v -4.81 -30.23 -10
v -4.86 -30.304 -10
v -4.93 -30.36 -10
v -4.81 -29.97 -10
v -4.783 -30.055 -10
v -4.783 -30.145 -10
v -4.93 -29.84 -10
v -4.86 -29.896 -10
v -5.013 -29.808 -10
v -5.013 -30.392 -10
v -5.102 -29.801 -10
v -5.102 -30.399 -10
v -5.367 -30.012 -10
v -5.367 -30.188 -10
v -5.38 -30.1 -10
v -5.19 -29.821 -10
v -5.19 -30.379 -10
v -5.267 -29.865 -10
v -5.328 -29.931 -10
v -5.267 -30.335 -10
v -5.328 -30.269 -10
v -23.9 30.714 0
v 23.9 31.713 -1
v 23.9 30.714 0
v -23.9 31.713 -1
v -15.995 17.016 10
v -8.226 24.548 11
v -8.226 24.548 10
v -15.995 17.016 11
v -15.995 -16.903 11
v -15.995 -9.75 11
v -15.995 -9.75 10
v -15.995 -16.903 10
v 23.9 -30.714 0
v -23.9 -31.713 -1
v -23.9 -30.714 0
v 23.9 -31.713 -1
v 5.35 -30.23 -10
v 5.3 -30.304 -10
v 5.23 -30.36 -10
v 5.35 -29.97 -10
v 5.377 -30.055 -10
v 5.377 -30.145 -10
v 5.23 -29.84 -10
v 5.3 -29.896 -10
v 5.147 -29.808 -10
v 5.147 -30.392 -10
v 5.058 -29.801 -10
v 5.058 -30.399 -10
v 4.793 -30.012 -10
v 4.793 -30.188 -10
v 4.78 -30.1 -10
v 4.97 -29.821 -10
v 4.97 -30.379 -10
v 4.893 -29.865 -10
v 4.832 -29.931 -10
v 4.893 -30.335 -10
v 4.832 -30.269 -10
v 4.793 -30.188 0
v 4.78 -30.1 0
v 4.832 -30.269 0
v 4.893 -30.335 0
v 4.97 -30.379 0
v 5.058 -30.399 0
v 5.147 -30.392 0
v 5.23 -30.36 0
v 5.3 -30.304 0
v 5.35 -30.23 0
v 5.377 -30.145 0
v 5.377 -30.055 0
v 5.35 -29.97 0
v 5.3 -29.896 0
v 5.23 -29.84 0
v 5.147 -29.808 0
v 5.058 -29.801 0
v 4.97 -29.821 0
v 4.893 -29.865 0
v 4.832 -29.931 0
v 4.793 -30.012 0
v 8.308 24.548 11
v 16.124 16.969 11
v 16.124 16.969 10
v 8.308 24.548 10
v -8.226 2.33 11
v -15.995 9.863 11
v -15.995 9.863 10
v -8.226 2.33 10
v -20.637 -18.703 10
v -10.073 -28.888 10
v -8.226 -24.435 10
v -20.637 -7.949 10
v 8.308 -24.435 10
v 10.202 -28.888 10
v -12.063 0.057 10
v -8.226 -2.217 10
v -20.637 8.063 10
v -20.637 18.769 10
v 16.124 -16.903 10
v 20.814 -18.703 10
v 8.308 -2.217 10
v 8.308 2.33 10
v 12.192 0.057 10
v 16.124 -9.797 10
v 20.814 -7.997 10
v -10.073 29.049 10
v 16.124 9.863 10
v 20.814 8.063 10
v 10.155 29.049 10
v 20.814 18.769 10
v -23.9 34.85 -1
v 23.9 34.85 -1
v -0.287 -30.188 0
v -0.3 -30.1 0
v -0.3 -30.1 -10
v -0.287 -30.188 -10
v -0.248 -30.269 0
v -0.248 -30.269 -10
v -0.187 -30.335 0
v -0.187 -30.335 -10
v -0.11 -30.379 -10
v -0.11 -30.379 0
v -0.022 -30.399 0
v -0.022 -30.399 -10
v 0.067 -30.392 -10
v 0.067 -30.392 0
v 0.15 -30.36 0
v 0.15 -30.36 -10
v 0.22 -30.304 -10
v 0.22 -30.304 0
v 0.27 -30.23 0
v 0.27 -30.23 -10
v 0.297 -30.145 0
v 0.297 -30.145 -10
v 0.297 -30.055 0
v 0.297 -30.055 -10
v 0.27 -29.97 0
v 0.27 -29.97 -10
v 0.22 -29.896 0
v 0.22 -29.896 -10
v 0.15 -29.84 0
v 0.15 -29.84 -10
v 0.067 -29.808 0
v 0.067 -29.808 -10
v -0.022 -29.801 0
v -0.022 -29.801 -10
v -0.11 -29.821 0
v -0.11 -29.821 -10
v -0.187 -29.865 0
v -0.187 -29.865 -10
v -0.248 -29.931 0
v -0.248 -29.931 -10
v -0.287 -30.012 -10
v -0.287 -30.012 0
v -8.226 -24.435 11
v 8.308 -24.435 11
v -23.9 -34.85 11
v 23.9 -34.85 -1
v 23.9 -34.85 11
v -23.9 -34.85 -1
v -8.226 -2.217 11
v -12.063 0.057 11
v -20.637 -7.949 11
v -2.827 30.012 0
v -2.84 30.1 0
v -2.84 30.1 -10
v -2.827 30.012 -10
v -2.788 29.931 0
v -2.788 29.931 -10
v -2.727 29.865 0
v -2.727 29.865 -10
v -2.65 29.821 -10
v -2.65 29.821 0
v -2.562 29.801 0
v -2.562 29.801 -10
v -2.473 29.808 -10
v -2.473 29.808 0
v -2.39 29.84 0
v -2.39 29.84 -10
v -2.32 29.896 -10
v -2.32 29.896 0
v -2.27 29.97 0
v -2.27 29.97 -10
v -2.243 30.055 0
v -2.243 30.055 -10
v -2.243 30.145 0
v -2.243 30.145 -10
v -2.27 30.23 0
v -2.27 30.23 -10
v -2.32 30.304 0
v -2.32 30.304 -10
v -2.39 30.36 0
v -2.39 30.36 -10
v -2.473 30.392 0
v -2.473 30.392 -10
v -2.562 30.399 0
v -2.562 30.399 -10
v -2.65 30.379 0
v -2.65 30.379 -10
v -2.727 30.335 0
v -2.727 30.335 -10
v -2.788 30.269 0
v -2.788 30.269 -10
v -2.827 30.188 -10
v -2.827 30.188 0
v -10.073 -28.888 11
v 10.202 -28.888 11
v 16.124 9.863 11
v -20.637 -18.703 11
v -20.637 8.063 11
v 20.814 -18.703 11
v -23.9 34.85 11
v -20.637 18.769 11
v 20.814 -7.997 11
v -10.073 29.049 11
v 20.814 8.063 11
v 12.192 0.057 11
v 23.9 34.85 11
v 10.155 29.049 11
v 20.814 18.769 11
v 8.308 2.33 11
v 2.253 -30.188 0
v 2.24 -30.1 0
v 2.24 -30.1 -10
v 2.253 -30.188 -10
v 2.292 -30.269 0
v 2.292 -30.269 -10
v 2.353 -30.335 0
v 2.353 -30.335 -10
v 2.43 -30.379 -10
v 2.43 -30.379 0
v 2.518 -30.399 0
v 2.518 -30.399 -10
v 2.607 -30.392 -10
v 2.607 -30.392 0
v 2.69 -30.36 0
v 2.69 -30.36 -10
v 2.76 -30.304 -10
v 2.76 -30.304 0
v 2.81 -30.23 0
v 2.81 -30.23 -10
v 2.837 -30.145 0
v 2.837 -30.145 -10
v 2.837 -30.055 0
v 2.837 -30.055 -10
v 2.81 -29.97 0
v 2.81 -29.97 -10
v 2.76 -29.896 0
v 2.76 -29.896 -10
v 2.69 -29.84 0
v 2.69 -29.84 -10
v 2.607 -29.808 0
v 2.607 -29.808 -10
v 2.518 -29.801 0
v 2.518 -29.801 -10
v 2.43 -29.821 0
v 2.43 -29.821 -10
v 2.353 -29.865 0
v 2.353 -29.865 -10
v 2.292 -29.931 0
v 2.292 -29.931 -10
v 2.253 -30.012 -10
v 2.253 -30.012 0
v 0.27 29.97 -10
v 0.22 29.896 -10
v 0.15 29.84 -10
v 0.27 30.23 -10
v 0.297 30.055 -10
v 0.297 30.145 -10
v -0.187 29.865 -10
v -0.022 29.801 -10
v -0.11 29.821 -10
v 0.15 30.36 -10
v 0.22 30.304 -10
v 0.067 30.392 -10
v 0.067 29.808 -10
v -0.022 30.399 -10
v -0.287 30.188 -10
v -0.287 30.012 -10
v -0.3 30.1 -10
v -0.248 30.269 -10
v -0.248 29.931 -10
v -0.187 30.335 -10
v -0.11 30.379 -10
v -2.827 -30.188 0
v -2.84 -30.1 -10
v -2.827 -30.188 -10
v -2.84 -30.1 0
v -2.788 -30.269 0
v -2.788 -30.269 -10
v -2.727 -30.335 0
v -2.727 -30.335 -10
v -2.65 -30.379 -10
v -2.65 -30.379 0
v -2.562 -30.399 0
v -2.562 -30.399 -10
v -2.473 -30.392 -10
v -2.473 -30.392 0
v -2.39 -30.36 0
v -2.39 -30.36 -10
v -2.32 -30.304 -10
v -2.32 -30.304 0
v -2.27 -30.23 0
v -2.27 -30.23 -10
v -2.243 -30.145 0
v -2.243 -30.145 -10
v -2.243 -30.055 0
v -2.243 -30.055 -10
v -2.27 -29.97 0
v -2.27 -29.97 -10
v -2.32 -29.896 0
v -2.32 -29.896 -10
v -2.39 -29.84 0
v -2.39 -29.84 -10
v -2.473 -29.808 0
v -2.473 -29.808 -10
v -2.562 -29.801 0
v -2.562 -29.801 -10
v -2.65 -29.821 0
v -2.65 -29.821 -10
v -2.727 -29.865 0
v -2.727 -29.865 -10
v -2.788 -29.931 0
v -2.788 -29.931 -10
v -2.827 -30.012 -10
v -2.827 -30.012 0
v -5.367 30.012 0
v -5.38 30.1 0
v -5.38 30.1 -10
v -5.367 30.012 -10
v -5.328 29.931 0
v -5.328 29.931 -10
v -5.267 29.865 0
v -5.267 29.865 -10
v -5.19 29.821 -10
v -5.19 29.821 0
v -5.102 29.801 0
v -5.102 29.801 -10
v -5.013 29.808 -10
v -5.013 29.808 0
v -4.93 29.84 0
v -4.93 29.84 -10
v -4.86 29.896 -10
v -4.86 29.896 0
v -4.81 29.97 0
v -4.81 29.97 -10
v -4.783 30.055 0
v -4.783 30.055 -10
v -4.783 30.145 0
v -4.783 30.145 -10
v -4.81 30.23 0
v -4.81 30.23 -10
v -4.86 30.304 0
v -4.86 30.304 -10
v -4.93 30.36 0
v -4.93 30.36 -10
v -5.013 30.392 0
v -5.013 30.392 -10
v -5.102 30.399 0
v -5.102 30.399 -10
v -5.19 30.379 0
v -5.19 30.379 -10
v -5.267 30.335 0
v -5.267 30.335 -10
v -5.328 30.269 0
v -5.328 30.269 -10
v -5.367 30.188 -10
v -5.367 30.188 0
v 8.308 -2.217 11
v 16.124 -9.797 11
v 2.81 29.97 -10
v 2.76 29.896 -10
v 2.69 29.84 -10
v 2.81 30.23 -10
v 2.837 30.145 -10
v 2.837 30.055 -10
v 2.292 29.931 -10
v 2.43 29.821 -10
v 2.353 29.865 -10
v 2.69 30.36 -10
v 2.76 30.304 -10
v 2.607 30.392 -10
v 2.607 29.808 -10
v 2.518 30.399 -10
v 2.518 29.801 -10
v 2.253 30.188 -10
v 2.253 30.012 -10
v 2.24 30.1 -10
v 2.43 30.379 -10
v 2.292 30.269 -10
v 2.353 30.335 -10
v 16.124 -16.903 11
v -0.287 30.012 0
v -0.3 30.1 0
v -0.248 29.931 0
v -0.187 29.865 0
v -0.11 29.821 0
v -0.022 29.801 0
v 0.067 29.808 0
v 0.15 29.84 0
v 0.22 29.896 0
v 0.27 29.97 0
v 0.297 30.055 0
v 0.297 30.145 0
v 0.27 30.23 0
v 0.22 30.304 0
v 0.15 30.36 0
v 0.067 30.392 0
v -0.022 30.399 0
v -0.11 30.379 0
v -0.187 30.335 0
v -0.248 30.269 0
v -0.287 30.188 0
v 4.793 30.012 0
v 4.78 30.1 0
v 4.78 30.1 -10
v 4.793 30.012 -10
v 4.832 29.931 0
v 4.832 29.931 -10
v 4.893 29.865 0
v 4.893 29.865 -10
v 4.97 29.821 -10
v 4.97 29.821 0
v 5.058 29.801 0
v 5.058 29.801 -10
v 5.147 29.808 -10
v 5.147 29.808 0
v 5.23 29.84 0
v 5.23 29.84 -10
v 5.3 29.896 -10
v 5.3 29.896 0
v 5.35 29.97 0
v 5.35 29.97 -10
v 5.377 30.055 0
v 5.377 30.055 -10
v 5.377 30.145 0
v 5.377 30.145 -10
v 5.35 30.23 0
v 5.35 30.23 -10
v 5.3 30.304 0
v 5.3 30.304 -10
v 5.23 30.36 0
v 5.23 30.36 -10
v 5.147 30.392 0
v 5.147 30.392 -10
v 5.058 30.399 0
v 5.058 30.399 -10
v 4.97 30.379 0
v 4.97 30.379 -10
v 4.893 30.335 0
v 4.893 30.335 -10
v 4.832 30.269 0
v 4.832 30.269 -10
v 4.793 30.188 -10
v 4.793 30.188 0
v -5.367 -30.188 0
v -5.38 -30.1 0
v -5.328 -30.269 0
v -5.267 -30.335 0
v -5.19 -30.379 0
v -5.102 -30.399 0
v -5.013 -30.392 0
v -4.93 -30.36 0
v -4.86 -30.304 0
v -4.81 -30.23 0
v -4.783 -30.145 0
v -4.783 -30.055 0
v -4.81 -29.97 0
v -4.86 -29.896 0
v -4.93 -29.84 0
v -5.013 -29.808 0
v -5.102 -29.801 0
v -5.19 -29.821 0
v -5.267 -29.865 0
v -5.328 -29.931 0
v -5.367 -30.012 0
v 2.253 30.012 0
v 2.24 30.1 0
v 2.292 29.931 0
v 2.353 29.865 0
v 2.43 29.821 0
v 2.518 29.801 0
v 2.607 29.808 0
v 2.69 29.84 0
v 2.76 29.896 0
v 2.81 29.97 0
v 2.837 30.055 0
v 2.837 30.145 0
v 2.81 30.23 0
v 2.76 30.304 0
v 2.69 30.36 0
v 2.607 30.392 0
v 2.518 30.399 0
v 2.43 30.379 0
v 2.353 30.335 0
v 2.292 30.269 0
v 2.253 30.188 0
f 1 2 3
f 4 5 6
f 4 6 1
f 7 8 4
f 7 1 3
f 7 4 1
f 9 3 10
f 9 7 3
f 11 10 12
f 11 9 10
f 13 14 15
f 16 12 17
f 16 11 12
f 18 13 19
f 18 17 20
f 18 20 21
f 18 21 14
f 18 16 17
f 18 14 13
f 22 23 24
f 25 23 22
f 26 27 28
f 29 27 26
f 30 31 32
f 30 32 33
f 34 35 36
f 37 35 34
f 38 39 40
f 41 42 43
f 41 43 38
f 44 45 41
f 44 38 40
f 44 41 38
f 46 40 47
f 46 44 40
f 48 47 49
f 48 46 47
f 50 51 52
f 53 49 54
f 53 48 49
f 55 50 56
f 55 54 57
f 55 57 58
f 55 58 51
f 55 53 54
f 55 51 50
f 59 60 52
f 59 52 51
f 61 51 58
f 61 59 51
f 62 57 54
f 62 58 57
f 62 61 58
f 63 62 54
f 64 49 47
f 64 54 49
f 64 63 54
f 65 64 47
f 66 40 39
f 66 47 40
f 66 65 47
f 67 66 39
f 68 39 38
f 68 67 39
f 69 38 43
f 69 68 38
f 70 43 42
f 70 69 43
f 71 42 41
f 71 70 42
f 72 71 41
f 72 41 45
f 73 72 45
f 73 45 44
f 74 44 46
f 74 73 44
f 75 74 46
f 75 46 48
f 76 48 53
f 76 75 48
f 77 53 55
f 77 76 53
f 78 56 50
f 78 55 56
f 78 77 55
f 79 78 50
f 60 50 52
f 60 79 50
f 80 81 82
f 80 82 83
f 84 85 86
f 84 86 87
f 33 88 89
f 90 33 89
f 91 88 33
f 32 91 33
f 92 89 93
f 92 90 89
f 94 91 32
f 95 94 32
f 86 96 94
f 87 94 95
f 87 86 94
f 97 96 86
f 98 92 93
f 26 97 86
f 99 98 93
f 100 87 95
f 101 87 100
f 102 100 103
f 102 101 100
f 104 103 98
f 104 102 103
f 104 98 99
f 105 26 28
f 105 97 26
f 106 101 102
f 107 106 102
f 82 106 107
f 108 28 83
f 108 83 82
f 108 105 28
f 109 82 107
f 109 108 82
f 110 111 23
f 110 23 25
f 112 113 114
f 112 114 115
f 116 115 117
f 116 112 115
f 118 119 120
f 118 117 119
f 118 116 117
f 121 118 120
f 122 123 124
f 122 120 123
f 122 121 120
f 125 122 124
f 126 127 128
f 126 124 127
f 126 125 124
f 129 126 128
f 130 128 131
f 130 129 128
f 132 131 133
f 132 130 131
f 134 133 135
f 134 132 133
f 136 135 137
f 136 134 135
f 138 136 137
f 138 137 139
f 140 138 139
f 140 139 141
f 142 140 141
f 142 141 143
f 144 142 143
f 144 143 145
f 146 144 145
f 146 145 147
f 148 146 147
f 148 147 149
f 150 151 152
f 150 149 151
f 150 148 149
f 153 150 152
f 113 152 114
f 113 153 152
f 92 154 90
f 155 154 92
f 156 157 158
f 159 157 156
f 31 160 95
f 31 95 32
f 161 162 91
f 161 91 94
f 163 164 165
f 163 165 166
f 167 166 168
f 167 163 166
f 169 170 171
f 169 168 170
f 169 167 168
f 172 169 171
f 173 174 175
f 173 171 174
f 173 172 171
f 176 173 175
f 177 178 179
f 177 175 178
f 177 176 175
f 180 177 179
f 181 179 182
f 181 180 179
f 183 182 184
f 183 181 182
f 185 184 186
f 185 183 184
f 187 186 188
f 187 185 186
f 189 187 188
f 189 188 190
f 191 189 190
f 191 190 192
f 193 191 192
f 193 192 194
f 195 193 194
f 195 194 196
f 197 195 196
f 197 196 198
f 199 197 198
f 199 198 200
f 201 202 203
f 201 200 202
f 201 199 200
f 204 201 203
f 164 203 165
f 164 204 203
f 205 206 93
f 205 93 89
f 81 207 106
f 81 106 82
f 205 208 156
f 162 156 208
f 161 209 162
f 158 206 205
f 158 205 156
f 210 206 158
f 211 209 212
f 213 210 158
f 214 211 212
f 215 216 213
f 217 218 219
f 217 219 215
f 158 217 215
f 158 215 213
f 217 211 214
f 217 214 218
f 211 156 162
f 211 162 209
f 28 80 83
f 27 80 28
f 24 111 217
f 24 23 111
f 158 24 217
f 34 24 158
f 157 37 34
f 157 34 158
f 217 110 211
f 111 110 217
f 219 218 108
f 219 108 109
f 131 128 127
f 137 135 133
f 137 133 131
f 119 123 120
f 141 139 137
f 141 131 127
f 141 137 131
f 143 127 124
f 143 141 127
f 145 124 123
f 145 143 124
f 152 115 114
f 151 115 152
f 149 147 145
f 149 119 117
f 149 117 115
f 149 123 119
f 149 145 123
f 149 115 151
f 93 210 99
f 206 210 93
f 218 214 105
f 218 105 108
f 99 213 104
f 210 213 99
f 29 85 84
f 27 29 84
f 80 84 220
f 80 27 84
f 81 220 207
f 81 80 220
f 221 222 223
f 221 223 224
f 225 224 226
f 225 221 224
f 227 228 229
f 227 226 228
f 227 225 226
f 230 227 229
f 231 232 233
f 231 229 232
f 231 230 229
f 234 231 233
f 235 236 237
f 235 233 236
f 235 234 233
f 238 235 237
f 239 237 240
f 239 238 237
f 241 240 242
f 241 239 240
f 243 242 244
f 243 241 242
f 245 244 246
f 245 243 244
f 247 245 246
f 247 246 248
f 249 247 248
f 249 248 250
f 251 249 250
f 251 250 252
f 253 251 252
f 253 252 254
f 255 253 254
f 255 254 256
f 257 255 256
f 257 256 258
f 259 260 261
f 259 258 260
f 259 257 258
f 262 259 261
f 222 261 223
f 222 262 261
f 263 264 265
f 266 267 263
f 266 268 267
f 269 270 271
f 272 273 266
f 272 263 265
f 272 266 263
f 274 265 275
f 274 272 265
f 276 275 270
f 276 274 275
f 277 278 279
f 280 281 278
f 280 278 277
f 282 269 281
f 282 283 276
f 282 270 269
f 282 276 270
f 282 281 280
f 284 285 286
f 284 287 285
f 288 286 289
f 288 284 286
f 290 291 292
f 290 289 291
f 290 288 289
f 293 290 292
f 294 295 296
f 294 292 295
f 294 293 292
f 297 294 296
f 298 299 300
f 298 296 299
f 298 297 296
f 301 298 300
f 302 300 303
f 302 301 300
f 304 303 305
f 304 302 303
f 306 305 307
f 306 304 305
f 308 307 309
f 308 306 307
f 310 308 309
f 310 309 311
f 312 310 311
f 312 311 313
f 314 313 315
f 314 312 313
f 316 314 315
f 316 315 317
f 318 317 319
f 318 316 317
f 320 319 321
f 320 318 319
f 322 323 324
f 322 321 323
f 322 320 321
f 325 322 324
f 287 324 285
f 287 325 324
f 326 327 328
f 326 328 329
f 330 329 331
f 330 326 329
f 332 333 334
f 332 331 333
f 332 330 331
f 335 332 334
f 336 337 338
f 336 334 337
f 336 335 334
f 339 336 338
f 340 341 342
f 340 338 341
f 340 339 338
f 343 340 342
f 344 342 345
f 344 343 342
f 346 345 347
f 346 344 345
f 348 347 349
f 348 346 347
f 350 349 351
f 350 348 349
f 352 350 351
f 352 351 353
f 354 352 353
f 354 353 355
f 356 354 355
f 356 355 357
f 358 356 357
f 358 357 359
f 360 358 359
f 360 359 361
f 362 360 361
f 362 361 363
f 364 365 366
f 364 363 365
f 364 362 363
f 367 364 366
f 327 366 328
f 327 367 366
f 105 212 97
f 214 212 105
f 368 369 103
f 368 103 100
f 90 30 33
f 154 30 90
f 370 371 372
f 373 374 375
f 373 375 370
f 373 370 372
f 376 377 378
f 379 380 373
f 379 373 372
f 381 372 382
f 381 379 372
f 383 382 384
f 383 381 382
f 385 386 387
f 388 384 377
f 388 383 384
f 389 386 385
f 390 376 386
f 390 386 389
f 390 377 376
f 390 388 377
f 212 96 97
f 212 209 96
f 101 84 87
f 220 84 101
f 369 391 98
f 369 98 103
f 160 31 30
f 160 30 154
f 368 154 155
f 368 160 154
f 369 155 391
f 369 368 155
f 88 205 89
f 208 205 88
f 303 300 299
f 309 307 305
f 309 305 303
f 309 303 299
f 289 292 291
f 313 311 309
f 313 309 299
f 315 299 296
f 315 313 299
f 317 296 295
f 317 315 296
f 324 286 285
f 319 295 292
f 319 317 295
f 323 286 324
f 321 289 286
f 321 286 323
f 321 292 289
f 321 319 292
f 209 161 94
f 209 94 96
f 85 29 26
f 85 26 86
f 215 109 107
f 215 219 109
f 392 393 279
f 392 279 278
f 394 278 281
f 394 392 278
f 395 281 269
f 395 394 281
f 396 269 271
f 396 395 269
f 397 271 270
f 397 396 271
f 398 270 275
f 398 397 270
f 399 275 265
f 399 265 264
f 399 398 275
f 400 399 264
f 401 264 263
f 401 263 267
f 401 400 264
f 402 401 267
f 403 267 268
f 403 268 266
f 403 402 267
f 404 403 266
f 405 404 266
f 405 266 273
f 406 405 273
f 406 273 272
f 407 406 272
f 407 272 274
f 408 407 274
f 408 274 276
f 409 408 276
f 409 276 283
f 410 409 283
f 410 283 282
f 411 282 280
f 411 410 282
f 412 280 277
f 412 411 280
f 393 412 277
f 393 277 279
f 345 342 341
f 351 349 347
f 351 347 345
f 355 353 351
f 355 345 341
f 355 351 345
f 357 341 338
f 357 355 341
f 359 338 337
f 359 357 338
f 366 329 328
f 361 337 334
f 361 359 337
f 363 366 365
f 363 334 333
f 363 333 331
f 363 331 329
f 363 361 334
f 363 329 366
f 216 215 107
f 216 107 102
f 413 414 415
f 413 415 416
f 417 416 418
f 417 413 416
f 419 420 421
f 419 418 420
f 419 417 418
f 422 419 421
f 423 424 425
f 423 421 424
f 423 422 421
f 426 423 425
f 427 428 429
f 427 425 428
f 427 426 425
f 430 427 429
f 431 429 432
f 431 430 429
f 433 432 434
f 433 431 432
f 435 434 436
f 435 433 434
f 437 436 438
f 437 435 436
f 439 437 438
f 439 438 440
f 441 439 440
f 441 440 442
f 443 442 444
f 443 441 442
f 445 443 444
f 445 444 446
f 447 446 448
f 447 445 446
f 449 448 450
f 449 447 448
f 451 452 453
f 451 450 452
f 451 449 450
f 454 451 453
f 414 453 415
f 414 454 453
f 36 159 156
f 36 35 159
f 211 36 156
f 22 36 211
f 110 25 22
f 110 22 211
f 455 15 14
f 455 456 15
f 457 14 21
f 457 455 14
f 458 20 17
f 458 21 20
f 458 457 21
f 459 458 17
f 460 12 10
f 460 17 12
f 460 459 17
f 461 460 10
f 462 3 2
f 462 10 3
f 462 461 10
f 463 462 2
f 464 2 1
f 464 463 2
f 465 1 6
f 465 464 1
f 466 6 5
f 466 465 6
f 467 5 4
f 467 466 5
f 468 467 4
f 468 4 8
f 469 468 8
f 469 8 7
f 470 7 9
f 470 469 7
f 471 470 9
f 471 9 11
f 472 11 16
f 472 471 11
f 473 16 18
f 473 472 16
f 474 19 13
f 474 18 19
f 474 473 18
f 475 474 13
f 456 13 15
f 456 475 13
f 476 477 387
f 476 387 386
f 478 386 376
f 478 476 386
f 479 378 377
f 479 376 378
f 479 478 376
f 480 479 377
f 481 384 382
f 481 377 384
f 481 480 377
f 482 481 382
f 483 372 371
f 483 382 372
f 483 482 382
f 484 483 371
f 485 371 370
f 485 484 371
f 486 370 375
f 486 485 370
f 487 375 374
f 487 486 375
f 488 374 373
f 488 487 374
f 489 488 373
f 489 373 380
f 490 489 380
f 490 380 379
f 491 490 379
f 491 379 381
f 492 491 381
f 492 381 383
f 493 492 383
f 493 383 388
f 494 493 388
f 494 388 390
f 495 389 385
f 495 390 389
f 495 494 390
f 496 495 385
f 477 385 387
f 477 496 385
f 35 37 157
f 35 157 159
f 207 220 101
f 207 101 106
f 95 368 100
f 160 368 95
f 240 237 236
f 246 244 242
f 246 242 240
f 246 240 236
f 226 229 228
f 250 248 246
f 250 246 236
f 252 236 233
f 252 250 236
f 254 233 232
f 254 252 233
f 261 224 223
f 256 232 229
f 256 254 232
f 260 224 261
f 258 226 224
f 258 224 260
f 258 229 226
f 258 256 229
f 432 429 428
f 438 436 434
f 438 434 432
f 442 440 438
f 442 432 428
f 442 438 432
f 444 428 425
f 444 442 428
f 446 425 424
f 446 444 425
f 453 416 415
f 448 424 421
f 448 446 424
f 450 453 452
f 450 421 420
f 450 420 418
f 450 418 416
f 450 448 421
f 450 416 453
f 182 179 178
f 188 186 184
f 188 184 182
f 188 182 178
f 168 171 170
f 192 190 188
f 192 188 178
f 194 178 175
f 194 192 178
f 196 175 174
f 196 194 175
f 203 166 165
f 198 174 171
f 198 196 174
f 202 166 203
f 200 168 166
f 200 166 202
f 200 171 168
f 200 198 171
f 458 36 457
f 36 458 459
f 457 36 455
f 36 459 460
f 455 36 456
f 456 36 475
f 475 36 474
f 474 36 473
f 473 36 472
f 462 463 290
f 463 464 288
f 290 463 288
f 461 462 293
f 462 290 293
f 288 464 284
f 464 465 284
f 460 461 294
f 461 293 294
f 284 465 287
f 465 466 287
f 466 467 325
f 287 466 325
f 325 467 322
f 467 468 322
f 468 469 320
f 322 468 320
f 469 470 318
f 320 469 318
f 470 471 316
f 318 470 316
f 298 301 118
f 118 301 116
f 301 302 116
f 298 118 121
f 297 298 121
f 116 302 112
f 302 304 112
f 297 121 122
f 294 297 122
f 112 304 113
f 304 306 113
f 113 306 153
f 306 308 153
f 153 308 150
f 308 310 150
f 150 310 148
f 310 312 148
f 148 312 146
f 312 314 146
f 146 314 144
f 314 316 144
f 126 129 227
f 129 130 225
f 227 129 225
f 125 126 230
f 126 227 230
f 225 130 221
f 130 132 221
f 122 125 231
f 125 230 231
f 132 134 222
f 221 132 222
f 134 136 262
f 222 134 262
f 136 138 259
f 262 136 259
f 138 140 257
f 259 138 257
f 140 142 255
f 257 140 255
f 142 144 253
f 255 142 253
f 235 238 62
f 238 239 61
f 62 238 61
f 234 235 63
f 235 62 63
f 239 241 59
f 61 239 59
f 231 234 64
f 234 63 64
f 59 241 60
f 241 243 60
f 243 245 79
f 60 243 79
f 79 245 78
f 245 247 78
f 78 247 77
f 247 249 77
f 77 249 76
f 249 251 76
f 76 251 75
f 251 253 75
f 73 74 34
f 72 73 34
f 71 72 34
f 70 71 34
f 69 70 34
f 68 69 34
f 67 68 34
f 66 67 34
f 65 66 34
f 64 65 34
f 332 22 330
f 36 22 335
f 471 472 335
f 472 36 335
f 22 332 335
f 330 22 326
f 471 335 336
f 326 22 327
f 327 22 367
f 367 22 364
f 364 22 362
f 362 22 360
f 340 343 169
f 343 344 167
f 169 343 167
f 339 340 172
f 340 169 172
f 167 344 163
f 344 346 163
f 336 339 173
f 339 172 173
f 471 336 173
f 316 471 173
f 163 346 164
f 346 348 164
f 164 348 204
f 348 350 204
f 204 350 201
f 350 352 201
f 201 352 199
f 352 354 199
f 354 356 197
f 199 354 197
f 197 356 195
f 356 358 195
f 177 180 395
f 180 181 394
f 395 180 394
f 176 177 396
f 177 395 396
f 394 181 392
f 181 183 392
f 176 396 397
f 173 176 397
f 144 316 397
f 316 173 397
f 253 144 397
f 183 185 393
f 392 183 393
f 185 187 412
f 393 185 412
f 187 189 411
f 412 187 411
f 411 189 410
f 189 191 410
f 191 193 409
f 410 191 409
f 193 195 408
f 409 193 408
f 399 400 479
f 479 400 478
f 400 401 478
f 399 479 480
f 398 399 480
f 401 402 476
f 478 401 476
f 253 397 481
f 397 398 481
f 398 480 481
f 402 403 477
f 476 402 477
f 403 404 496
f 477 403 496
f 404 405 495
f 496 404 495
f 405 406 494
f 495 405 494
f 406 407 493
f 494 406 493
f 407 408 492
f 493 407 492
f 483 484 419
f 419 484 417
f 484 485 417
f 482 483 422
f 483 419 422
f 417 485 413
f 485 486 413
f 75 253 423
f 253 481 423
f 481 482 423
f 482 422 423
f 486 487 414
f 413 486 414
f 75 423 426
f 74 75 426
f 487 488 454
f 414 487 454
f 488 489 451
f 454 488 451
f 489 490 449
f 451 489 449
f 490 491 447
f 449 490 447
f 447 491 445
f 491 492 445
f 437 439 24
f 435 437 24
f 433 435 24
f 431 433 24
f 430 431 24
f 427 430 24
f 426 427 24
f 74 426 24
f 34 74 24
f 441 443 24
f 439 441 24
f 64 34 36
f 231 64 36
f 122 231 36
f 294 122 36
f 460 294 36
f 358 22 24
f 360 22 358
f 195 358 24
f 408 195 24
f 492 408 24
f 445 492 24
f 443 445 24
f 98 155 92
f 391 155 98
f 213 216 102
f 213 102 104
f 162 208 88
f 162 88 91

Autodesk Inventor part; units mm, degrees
ref_plane "YZ Plane" through (0, 0, 0) normal (1, 0, 0) x (0, 1, 0)
ref_plane "XZ Plane" through (0, 0, 0) normal (0, 1, 0) x (-1, 0, 0)
ref_plane "XY Plane" through (0, 0, 0) normal (0, 0, 1) x (1, 0, 0)
sketch "Sketch1" plane through (0, 0, 0) normal (0, 0, 1) x (1, 0, 0)
  line L0 (-23.9, 34.85) -> (23.9, 34.85)
  line L1 (23.9, 34.85) -> (23.9, -34.85)
  line L2 (23.9, -34.85) -> (-23.9, -34.85)
  line L3 (-23.9, -34.85) -> (-23.9, 34.85)
  dimension "d0" = 47.8
  dimension "d1" = 69.7
extrude "Extrusion1" add sketch "Sketch1" along normal blind 11
sketch "Sketch2" plane through (0, 0, 0) normal (0, 0, -1) x (-1, 0, 0)
  line L0 (-23.9, 34.85) -> (23.9, 34.85) projected
  line L1 (23.9, 34.85) -> (23.9, -34.85) projected
  line L2 (-23.9, 34.85) -> (23.9, 34.85)
  line L3 (23.9, 34.85) -> (23.9, 31.7132)
  line L4 (23.9, 31.7132) -> (-23.9, 31.7132)
  line L5 (-23.9, 31.7132) -> (-23.9, 34.85)
  line L6 (23.9, -34.85) -> (-23.9, -34.85) projected
  line L7 (-23.9, -34.85) -> (-23.9, 34.85) projected
  line L8 (23.9, -34.85) -> (-23.9, -34.85)
  line L9 (-23.9, -34.85) -> (-23.9, -31.7132)
  line L10 (-23.9, -31.7132) -> (23.9, -31.7132)
  line L11 (23.9, -31.7132) -> (23.9, -34.85)
  line L12 (-23.9, 34.85) -> (23.9, 34.85)
  line L13 (23.9, 34.85) -> (23.9, 31.7132)
  line L14 (23.9, 31.7132) -> (-23.9, 31.7132)
  line L15 (-23.9, 31.7132) -> (-23.9, 34.85)
  line L16 (-23.9, -31.7132) -> (23.9, -31.7132)
  line L17 (23.9, -31.7132) -> (23.9, -34.85)
  line L18 (23.9, -34.85) -> (-23.9, -34.85)
  line L19 (-23.9, -34.85) -> (-23.9, -31.7132)
  point P0 (0, 0)
  dimension "d4" = 3.1368
  dimension "d5" = 3.1368
extrude "Extrusion2" add sketch "Sketch2" along normal blind 1 contours L0 L1 L4 L5 | L10 L1 L6 L7
chamfer "Chamfer1" distance 1 distance2 1 1 edges at (0, 31.7132, 0) measured on face at (-7.9667, -10.5711, 0)
chamfer "Chamfer2" distance 1 distance2 1 1 edges at (0, -31.7132, 0) measured on face at (-7.9667, -10.9042, 0)
sketch "Sketch3" plane through (0, 0, 0) normal (0, 0, -1) x (-1, 0, 0)
  circle A0 centre (0, 30.1) radius 0.3
  circle A1 centre (2.54, 30.1) radius 0.3
  circle A2 centre (5.08, 30.1) radius 0.3
  line L0 (-23.9, 30.7132) -> (23.9, 30.7132) projected
  line L1 (0, 30.7132) -> (0, 27.4639)
  circle A3 centre (-2.54, 30.1) radius 0.3
  circle A4 centre (-5.08, 30.1) radius 0.3
  line L2 (-5.649, 0) -> (7.1976, 0)
  circle A5 centre (0, -30.1) radius 0.3
  circle A6 centre (2.54, -30.1) radius 0.3
  circle A7 centre (5.08, -30.1) radius 0.3
  circle A8 centre (-2.54, -30.1) radius 0.3
  circle A9 centre (-5.08, -30.1) radius 0.3
  point P0 (0, 0)
  dimension "d14" = 0.6
  dimension "d15" = 0.6
  dimension "d16" = 0.6
extrude "Extrusion3" add sketch "Sketch3" along normal blind 10
sketch "Sketch4" plane through (0, 0, 11) normal (0, 0, 1) x (1, 0, 0)
  line L0 (-28.3117, 29.0487) -> (26.925, 29.0487) construction
  line L1 (26.925, 29.0487) -> (26.925, -28.8882) construction
  line L2 (26.925, -28.8882) -> (-28.3117, -28.8882) construction
  line L3 (-28.3117, -28.8882) -> (-28.3117, 29.0487) construction
  line L4 (20.8139, -18.7031) -> (10.2024, -28.8882)
  line L5 (10.2024, -28.8882) -> (-10.0732, -28.8882)
  line L6 (-10.0732, -28.8882) -> (-20.6373, -18.7031)
  line L7 (-20.6373, -18.7031) -> (-20.6373, -7.9494)
  line L8 (-20.6373, -7.9494) -> (-12.0628, 0.0566)
  line L9 (-12.0628, 0.0566) -> (-20.6373, 8.0626)
  line L10 (-20.6373, 8.0626) -> (-20.6373, 18.7688)
  line L11 (-20.6373, 18.7688) -> (-10.0732, 29.0487)
  line L12 (-10.0732, 29.0487) -> (10.155, 29.0487)
  line L13 (10.155, 29.0487) -> (20.8139, 18.7688)
  line L14 (20.8139, 18.7688) -> (20.8139, 8.0626)
  line L15 (20.8139, 8.0626) -> (12.192, 0.0566)
  line L16 (12.192, 0.0566) -> (20.8139, -7.9968)
  line L17 (20.8139, -7.9968) -> (20.8139, -18.7031)
  line L18 (16.124, -16.9029) -> (16.124, -9.797)
  line L19 (16.124, -9.797) -> (8.3075, -2.2173)
  line L20 (8.3075, -2.2173) -> (-8.2256, -2.2173)
  line L21 (-8.2256, -2.2173) -> (-15.9948, -9.7496)
  line L22 (-15.9948, -9.7496) -> (-15.9948, -16.9029)
  line L23 (-15.9948, -16.9029) -> (-8.2256, -24.4352)
  line L24 (-8.2256, -24.4352) -> (8.3075, -24.4352)
  line L25 (8.3075, -24.4352) -> (16.124, -16.9029)
  line L26 (16.124, 9.8627) -> (16.124, 16.9687)
  line L27 (16.124, 16.9687) -> (8.3075, 24.5483)
  line L28 (8.3075, 24.5483) -> (-8.2256, 24.5483)
  line L29 (-8.2256, 24.5483) -> (-15.9948, 17.016)
  line L30 (-15.9948, 17.016) -> (-15.9948, 9.8627)
  line L31 (-15.9948, 9.8627) -> (-8.2256, 2.3305)
  line L32 (-8.2256, 2.3305) -> (8.3075, 2.3305)
  line L33 (8.3075, 2.3305) -> (16.124, 9.8627)
  point P0 (0, 0)
extrude "Extrusion4" cut sketch "Sketch4" against normal blind 1
properties part number "Digit"
